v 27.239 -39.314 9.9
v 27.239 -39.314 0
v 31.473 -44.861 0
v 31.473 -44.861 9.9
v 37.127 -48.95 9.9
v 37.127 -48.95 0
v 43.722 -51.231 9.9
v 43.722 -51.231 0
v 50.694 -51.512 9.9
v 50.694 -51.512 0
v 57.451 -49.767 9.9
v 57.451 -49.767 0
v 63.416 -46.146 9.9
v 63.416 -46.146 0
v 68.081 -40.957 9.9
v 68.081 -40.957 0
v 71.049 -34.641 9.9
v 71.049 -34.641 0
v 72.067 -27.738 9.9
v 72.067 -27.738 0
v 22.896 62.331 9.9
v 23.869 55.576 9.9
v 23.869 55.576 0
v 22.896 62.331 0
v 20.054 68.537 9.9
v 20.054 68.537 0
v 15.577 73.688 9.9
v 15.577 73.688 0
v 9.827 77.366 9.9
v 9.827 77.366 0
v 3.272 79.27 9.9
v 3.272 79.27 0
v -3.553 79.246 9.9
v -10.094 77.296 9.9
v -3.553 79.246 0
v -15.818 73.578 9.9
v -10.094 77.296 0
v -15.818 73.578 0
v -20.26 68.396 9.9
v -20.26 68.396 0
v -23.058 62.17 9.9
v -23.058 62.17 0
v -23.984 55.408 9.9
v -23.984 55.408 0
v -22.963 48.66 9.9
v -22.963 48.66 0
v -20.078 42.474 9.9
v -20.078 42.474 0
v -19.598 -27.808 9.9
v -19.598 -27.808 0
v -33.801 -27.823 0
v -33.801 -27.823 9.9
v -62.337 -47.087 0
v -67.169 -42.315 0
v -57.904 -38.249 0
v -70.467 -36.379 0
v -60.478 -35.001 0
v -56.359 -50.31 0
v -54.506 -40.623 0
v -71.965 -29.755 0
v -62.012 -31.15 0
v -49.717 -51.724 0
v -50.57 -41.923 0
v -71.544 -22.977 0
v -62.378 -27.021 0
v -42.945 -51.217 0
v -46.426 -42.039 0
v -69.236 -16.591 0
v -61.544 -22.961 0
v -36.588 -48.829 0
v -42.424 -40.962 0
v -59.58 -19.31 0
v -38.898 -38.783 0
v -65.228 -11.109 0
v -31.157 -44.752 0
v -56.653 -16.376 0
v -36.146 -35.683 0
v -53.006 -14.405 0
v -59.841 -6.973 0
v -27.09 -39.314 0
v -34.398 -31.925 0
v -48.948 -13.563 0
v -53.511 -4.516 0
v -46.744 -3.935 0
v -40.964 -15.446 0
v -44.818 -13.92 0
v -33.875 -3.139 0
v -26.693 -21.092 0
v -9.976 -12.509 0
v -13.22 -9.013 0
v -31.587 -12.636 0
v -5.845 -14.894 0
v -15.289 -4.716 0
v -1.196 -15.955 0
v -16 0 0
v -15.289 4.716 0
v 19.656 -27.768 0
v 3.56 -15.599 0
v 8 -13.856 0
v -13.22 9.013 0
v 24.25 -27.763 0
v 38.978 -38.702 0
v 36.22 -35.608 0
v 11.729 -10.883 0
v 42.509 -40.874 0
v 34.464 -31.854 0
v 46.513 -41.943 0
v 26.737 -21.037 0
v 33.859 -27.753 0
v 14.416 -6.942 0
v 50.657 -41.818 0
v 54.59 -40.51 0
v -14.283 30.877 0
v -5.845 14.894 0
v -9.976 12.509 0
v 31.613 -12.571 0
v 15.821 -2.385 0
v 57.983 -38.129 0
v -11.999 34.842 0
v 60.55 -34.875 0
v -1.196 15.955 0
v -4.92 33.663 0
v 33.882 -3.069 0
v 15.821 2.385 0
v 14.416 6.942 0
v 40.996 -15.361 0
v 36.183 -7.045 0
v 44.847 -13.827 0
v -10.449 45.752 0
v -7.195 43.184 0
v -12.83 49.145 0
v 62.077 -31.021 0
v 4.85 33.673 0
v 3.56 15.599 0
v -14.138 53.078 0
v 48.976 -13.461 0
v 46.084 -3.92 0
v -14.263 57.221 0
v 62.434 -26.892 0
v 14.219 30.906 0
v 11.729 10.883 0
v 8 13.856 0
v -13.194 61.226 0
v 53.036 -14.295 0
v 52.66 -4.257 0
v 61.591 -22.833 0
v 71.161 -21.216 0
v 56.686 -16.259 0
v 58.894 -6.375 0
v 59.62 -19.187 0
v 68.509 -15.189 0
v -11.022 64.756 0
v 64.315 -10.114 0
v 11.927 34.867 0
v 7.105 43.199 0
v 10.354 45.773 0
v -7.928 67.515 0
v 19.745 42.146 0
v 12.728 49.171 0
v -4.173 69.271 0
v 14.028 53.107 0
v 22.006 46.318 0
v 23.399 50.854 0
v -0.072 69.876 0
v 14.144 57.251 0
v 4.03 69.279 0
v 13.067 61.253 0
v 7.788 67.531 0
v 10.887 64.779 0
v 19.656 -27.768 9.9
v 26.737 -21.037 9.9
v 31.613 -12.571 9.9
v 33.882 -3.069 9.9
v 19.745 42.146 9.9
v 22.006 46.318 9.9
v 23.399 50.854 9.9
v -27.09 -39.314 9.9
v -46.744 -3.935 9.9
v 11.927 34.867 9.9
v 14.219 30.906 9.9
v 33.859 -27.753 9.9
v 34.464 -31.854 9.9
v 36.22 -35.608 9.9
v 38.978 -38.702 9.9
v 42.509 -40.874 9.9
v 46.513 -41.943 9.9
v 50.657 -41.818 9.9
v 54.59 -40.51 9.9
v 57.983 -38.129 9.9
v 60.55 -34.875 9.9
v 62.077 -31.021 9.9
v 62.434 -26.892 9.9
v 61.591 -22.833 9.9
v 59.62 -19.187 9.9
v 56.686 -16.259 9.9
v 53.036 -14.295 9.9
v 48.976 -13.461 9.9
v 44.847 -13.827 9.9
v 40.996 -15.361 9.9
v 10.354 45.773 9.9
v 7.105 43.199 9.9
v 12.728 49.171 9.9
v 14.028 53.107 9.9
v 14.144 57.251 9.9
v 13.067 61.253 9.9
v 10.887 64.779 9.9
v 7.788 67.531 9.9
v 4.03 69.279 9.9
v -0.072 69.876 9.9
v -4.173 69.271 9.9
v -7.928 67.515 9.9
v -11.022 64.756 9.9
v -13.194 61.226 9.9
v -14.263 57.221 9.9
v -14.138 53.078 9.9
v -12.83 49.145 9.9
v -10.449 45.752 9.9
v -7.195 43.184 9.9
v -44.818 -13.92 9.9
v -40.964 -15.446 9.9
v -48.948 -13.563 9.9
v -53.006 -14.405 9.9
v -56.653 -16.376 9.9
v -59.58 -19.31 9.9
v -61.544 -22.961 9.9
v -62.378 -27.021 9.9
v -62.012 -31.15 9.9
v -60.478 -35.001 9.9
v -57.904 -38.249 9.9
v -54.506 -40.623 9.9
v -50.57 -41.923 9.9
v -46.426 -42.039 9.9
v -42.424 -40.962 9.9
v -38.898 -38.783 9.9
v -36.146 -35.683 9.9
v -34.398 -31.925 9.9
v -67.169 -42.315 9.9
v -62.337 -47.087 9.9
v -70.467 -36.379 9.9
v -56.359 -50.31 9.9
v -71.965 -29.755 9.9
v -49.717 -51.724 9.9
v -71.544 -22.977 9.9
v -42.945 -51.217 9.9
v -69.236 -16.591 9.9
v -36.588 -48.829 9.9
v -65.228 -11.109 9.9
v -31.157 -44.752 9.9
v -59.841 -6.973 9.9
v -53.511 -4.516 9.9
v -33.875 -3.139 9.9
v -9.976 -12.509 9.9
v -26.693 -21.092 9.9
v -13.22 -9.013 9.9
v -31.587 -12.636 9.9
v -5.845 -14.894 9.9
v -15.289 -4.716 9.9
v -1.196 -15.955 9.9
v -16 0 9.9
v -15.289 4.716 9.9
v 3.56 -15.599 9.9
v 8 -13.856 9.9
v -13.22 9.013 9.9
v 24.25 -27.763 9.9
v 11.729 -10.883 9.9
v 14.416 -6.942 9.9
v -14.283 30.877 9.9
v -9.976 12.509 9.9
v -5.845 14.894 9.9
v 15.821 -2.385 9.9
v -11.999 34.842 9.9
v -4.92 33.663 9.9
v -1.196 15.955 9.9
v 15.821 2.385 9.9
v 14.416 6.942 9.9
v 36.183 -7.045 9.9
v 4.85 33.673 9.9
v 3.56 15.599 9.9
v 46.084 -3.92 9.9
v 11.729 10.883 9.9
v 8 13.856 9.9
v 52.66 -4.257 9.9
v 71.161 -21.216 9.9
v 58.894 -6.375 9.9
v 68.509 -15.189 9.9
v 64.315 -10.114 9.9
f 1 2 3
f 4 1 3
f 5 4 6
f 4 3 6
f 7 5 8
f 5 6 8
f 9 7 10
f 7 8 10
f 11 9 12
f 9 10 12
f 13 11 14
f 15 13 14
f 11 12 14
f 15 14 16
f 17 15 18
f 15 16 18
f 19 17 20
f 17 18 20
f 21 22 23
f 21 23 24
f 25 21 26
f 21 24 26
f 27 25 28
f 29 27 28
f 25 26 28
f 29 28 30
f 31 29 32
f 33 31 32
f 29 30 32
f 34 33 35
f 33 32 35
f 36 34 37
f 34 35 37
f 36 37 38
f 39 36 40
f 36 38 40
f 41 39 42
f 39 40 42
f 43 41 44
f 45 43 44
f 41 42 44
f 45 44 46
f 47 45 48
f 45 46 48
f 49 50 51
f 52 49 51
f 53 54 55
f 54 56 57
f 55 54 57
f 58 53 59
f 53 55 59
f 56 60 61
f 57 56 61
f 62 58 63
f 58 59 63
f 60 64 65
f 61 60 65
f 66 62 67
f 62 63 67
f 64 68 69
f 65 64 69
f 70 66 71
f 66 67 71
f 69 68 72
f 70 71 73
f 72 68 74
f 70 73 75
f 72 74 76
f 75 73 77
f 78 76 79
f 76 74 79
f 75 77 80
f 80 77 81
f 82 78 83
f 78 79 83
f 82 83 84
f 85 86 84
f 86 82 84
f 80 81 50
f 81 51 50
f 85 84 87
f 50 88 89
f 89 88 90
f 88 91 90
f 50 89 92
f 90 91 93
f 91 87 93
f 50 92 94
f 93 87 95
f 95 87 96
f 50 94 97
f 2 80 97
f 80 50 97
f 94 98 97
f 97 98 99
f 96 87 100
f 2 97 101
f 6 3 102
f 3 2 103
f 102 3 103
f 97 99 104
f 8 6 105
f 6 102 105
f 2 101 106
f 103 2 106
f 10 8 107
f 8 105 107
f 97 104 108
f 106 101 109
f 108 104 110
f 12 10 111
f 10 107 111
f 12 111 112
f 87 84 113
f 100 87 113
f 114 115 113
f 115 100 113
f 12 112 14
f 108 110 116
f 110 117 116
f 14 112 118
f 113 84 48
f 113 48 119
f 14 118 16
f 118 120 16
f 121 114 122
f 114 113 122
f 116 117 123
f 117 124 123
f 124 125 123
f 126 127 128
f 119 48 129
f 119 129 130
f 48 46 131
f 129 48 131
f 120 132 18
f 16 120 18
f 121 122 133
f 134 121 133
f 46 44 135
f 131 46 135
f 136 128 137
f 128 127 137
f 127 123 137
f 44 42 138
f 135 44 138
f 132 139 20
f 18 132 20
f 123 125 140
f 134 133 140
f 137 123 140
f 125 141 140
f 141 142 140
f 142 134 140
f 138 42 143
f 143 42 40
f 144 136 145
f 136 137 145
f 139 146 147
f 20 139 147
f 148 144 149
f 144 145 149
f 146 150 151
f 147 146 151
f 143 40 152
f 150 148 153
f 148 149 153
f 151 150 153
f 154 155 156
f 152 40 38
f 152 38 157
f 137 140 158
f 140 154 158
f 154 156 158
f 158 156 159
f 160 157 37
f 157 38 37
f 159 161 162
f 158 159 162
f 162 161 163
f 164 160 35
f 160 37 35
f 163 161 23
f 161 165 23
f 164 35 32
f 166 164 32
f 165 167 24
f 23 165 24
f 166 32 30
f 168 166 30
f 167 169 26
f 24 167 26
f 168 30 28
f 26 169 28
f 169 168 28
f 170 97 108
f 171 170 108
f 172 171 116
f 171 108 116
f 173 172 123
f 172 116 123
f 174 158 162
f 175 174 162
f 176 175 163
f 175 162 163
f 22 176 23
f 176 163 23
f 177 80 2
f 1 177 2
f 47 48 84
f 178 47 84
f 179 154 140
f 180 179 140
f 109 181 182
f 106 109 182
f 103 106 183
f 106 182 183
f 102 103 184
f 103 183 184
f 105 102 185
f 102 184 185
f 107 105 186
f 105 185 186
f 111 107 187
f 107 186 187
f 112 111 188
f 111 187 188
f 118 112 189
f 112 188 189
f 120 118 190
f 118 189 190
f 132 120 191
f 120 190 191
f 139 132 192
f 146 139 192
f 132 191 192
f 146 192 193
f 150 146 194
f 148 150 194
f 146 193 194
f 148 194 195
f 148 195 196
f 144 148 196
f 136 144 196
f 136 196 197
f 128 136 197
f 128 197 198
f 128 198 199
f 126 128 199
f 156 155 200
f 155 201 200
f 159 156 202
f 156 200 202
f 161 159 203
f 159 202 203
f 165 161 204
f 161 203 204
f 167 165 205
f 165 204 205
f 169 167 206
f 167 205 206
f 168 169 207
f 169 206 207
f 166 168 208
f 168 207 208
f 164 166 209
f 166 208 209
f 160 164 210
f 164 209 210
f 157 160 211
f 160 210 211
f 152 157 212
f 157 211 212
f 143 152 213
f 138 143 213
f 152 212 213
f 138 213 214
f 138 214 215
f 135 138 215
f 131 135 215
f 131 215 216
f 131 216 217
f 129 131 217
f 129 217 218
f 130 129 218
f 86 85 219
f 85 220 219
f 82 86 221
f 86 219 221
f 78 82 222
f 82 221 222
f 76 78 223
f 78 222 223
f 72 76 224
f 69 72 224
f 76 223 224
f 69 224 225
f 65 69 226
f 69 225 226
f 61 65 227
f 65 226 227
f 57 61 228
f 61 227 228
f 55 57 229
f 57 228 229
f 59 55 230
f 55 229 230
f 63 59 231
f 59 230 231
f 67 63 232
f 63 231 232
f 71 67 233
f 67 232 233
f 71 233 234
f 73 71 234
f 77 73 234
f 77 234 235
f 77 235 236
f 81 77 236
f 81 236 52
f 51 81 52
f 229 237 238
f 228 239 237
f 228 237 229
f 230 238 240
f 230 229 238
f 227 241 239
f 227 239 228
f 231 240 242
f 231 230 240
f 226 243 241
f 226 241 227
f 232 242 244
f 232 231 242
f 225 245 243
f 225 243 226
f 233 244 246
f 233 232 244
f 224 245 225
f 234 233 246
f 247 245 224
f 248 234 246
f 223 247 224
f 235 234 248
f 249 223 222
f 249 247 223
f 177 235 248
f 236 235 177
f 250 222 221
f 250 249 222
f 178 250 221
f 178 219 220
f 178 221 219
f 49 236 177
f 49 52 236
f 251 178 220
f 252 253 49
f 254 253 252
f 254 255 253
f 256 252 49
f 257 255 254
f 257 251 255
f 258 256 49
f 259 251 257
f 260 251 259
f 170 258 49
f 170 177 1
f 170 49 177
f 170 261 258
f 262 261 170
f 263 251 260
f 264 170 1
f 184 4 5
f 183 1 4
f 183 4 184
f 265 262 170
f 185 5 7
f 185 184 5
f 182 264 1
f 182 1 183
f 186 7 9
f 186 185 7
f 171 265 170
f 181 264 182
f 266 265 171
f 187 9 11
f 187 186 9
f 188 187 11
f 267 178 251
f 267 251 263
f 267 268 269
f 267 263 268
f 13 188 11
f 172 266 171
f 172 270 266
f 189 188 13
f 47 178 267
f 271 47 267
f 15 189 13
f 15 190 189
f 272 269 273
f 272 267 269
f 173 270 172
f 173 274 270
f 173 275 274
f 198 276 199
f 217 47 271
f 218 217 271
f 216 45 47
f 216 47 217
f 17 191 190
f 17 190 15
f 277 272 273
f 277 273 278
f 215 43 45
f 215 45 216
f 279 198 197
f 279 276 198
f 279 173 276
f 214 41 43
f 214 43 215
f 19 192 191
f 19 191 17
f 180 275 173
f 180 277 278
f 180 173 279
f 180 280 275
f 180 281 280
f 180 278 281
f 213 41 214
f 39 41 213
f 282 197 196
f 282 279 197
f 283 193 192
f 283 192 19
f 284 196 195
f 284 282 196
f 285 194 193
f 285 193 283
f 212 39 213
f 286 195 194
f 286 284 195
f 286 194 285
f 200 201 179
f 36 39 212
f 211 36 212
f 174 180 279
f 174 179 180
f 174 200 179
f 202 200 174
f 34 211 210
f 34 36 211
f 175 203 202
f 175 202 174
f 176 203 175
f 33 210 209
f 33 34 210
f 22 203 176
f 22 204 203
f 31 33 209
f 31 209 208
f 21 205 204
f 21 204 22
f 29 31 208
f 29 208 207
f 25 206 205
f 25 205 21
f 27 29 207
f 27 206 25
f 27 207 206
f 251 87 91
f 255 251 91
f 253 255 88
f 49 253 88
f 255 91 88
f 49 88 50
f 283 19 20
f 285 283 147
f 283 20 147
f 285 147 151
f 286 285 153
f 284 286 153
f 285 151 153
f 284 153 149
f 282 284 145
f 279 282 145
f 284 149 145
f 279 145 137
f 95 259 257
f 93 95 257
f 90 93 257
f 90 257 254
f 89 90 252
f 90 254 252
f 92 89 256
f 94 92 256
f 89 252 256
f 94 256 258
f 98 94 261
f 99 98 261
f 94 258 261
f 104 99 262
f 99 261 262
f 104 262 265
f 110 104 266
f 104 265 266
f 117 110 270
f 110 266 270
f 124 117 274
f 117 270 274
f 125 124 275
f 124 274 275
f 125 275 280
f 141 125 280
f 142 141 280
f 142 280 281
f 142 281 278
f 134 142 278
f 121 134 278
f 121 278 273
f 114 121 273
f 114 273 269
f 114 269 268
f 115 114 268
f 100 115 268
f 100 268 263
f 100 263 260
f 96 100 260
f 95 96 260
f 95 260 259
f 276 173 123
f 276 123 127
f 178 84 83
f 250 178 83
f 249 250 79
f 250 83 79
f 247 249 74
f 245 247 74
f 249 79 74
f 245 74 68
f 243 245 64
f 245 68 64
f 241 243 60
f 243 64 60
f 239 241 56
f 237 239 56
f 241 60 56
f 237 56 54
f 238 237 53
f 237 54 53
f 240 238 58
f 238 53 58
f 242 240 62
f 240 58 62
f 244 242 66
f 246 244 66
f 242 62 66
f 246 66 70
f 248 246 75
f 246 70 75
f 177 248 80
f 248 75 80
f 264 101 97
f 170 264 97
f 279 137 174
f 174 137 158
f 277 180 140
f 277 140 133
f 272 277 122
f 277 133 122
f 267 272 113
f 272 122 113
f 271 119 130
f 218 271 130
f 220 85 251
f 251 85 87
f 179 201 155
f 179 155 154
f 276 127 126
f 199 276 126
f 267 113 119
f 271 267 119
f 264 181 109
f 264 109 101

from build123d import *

# Parameters (mm, degrees)
F1_DEPTH = 9.9
F2_R     = 34.0204521672
F3_DEPTH = 9.9
F4_D     = 28.6
F5_D     = 32


with BuildPart() as f1:
    # F0 (on Top) → F1 (new body)
    with BuildSketch(Plane.XY):
        with BuildLine():
            Line((-11.9994940177, 34.8422084712), (-0.0575622945, 55.5758049985))
            Line((-0.0575622945, 55.5758049985), (11.9272931484, 34.8669904922))
            ThreePointArc((11.9272931484, 34.8669904922), (16.2473796766, 38.0646478249), (19.7447123991, 42.1459250585))
            ThreePointArc((19.7447123991, 42.1459250585), (22.8148755334, 48.5513230922), (23.8692377055, 55.5758049985))
            ThreePointArc((23.8692377055, 55.5758049985), (-6.8934905458, 78.5053022276), (-20.0782891833, 42.4738107578))
            ThreePointArc((-20.0782891833, 42.4738107578), (-16.4881199464, 38.1824576068), (-11.9994940177, 34.8422084712))
        make_face()
        with BuildLine():
            ThreePointArc((19.7447123991, 42.1459250585), (16.2473796766, 38.0646478249), (11.9272931484, 34.8669904922))
            Line((11.9272931484, 34.8669904922), (36.1831113199, -7.0450076633))
            ThreePointArc((36.1831113199, -7.0450076633), (40.9619383877, -4.9383860109), (46.084167971, -3.9196578694))
            Line((46.084167971, -3.9196578694), (19.7447123991, 42.1459250585))
        make_face()
        with BuildLine():
            Line((-36.1522240312, -7.0917910472), (-11.9994940177, 34.8422084712))
            ThreePointArc((-11.9994940177, 34.8422084712), (-16.4881199464, 38.1824576068), (-20.0782891833, 42.4738107578))
            Line((-20.0782891833, 42.4738107578), (-46.7444930565, -3.9351598474))
            ThreePointArc((-46.7444930565, -3.9351598474), (-41.2637040523, -4.8938560089), (-36.1522240312, -7.0917910472))
        make_face()
        with BuildLine():
            ThreePointArc((46.084167971, -3.9196578694), (40.9619383877, -4.9383860109), (36.1831113199, -7.0450076633))
            Line((36.1831113199, -7.0450076633), (48.1588401117, -27.7380520899))
            Line((48.1588401117, -27.7380520899), (24.2502735607, -27.7628152391))
            ThreePointArc((24.2502735607, -27.7628152391), (25.0126751704, -33.7276444175), (27.2392931133, -39.3135745888))
            ThreePointArc((27.2392931133, -39.3135745888), (54.1364448927, -50.8873157676), (72.0674194868, -27.7380520899))
            ThreePointArc((72.0674194868, -27.7380520899), (64.3146084961, -10.1138835806), (46.084167971, -3.9196578694))
        make_face()
        with BuildLine():
            Line((-48.1012778172, -27.8377529085), (-36.1522240312, -7.0917910472))
            ThreePointArc((-36.1522240312, -7.0917910472), (-41.2637040523, -4.8938560089), (-46.7444930565, -3.9351598474))
            ThreePointArc((-46.7444930565, -3.9351598474), (-69.0295446869, -39.464552372), (-27.0898443417, -39.3135745888))
            ThreePointArc((-27.0898443417, -39.3135745888), (-24.9041765549, -33.7596878084), (-24.1602080848, -27.8377529085))
            ThreePointArc((-24.1602080848, -27.8377529085), (-24.1602112952, -27.8253545065), (-24.1602209263, -27.8129561077))
            Line((-24.1602209263, -27.8129561077), (-48.1012778172, -27.8377529085))
        make_face()
        with BuildLine():
            ThreePointArc((27.2392931133, -39.3135745888), (25.0126751704, -33.7276444175), (24.2502735607, -27.7628152391))
            Line((24.2502735607, -27.7628152391), (-24.1602209263, -27.8129561077))
            ThreePointArc((-24.1602209263, -27.8129561077), (-24.1602112952, -27.8253545065), (-24.1602080848, -27.8377529085))
            ThreePointArc((-24.1602080848, -27.8377529085), (-24.9041765549, -33.7596878084), (-27.0898443417, -39.3135745888))
            Line((-27.0898443417, -39.3135745888), (27.2392931133, -39.3135745888))
        make_face()
    extrude(amount=F1_DEPTH)

    # F2 (on Top) → F3 (join)
    with BuildSketch(Plane.XY):
        Circle(F2_R)
    extrude(amount=F3_DEPTH)

    # F4 (through all)
    with Locations(Plane(origin=(0, 0, 0), x_dir=(1, 0, 0), z_dir=(0, 0, -1))):
        with Locations((-0.0575622945, -55.5758049985), (48.1588401117, 27.7380520899), (-48.1012778172, 27.8377529085)):
            Hole(F4_D / 2)

    # F5 (through all)
    with Locations(Plane(origin=(0, 0, 0), x_dir=(1, 0, 0), z_dir=(0, 0, -1))):
        with Locations((0, 0)):
            Hole(F5_D / 2)


solid = f1.part
